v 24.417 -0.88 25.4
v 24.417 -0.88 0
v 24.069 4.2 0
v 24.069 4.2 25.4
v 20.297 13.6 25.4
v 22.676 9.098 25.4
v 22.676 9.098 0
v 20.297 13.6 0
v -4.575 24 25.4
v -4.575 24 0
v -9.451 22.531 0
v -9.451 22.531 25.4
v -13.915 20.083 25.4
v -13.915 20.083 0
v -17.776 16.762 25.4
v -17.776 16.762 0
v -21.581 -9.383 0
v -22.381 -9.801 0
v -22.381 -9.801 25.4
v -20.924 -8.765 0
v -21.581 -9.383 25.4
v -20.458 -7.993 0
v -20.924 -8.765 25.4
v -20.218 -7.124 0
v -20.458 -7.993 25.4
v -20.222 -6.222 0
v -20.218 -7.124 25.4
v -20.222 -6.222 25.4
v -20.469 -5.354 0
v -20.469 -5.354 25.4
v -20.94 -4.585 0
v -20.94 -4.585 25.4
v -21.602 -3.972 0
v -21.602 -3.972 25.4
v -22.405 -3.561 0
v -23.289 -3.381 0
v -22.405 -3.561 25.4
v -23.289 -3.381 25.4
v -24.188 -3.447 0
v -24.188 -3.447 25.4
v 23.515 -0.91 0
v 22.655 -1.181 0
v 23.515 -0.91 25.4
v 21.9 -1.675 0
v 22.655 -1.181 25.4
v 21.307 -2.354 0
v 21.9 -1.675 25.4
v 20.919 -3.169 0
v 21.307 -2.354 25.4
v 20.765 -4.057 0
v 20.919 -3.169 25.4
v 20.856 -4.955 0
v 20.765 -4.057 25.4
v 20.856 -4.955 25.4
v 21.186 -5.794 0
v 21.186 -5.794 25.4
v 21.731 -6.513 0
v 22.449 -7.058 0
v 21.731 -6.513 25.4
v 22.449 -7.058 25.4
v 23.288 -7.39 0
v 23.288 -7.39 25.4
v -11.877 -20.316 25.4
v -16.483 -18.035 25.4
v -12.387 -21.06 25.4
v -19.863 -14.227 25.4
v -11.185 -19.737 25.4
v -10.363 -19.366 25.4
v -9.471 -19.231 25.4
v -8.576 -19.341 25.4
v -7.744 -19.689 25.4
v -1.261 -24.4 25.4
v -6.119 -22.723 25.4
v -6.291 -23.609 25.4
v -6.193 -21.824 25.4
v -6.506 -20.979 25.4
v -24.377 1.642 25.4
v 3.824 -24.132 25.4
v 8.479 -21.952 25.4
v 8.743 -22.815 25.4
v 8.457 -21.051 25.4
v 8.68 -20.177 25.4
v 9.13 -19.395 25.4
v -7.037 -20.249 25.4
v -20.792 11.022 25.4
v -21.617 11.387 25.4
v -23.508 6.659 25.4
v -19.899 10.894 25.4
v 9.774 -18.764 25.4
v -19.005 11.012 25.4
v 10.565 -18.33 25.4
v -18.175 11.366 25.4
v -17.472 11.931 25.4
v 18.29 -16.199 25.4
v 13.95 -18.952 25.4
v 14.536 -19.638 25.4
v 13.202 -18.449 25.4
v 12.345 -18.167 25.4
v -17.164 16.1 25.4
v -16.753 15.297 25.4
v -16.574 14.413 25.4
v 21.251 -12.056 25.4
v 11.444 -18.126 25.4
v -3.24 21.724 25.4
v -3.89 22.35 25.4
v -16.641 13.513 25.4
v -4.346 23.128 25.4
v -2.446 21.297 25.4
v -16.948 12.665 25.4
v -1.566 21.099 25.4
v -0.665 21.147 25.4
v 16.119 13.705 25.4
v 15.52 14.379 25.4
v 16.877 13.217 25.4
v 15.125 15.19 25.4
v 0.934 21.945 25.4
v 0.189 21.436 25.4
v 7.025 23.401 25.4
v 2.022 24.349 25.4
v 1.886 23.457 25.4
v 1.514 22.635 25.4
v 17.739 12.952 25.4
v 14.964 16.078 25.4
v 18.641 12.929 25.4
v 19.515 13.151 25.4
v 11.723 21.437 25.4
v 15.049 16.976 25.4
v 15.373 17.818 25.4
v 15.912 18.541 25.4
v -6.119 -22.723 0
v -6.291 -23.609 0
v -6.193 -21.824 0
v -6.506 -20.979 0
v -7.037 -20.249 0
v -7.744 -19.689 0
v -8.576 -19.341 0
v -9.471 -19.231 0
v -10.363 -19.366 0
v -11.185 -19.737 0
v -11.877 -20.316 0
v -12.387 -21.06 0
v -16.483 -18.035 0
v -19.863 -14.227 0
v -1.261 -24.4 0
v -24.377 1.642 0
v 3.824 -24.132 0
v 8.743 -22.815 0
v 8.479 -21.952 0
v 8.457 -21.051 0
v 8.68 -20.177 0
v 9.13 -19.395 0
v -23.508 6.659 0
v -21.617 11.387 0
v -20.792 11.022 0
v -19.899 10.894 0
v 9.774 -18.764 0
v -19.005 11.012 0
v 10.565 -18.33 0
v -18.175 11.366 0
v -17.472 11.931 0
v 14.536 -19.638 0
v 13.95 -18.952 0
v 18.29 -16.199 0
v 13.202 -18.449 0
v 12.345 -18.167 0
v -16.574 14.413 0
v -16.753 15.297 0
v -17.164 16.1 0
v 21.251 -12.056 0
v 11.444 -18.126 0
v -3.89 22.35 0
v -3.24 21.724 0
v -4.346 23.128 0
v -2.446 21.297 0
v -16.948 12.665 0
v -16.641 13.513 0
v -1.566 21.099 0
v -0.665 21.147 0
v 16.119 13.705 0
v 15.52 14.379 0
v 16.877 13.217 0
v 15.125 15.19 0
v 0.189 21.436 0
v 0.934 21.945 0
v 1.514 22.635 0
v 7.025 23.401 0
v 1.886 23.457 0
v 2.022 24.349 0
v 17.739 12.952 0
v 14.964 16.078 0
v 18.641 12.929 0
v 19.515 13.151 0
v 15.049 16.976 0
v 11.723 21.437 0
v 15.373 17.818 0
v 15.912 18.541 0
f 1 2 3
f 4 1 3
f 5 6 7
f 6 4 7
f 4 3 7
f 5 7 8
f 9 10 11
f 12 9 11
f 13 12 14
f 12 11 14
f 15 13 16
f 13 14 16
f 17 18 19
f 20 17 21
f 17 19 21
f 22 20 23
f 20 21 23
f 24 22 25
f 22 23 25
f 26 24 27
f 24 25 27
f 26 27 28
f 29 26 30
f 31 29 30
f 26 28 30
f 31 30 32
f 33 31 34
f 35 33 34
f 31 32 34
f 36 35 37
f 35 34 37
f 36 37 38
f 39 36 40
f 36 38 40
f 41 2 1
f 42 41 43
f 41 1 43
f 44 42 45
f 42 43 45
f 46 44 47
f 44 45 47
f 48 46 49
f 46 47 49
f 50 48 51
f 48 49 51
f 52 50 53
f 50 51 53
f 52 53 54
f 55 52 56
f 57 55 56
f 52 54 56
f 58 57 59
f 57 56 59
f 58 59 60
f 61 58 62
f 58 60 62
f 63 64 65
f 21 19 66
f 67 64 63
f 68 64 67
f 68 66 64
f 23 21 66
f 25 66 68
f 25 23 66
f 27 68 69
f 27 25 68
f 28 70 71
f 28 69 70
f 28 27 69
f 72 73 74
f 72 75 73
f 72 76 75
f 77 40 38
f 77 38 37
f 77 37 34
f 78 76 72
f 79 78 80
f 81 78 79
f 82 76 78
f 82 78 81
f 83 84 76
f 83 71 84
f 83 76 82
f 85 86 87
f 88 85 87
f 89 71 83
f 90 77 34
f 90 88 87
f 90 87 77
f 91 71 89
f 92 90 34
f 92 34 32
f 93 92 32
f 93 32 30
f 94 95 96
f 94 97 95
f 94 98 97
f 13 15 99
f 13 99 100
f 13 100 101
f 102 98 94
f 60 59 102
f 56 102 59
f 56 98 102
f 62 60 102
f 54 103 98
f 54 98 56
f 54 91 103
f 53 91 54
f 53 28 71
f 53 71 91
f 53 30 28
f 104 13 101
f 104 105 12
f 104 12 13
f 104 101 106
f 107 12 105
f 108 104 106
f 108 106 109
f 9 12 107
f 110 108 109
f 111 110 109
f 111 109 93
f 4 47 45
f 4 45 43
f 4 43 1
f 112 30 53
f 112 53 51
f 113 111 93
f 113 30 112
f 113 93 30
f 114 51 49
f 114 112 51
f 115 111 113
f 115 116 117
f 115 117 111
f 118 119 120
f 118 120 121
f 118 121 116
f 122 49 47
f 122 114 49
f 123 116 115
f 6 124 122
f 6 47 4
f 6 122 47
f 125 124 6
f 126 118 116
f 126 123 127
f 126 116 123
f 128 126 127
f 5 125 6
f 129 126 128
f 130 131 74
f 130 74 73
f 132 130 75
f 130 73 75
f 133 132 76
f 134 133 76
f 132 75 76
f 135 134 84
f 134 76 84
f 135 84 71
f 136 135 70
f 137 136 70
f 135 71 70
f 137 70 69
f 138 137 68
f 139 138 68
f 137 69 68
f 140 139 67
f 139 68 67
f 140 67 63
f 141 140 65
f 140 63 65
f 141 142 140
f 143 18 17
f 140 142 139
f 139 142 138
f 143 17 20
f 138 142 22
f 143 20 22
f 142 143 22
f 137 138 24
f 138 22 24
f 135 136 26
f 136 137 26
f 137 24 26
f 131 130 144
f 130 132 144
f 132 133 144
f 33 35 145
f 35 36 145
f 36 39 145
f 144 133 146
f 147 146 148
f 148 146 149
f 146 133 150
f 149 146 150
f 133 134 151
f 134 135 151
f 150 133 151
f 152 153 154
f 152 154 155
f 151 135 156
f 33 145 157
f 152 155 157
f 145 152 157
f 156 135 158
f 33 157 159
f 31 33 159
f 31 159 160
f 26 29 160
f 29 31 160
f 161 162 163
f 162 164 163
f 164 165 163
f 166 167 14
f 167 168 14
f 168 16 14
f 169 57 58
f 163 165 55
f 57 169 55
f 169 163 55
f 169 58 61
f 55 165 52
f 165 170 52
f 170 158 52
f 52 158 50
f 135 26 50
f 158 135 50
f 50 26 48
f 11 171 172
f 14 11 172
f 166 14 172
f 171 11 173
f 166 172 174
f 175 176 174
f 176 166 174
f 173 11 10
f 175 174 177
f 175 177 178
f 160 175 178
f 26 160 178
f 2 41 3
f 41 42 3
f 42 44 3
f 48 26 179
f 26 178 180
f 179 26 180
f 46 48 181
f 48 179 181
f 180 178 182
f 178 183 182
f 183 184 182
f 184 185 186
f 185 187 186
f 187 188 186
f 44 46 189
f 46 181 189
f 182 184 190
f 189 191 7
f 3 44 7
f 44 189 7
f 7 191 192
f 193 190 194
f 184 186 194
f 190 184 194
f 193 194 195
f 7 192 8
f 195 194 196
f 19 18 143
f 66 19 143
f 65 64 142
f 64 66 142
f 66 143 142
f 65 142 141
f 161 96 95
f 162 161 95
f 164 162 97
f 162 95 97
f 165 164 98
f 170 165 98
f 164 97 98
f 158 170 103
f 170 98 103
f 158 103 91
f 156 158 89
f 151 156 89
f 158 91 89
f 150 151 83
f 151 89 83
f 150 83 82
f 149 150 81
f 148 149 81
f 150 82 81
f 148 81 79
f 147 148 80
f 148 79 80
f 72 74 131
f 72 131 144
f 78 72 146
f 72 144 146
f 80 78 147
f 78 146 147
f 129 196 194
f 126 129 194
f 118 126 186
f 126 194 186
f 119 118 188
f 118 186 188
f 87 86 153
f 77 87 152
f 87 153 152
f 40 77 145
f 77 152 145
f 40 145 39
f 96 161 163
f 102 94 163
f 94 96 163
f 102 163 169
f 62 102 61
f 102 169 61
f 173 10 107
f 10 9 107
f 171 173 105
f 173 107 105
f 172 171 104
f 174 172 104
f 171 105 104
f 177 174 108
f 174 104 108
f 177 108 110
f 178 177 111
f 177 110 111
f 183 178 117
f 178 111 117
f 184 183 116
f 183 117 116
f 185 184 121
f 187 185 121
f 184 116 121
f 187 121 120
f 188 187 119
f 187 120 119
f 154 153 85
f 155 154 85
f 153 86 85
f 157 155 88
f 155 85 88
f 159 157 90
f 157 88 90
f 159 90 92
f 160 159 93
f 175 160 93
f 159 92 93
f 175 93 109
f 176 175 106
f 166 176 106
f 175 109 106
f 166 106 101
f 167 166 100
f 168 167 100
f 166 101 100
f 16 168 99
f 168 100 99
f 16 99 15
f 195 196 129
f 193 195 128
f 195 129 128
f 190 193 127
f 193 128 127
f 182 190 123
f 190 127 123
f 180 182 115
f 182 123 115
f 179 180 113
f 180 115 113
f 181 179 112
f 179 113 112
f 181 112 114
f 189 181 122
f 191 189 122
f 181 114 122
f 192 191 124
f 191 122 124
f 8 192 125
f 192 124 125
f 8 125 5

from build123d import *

# Parameters (mm, degrees)
F0_R          = 24.432621
F1_DEPTH      = 25.4
F2_R          = 3.310973
F3_DEPTH      = 5.842
F3_DEPTH_BACK = 30.988
F4_COUNT      = 7


with BuildPart() as f1:
    # F0 (on Top) → F1 (new body)
    with BuildSketch(Plane.XY):
        Circle(F0_R)
    extrude(amount=F1_DEPTH)


with BuildPart() as f3:
    # F2 (on face) → F3 (new body, two sides)
    with BuildSketch(Plane.XY.offset(25.4)) as f3_sk:
        with Locations((-9.425403, -22.541401)):
            Circle(F2_R)
    extrude(amount=F3_DEPTH)
    extrude(f3_sk.sketch, amount=-F3_DEPTH_BACK)


with BuildPart() as f4_1:
    # F4: instance of F3
    add(f3.part.rotate(Axis((0, 0, 25.4), (0, 0, 1)), 1 * 360 / F4_COUNT))


with BuildPart() as f4_2:
    # F4: instance of F3
    add(f3.part.rotate(Axis((0, 0, 25.4), (0, 0, 1)), 2 * 360 / F4_COUNT))


with BuildPart() as f4_3:
    # F4: instance of F3
    add(f3.part.rotate(Axis((0, 0, 25.4), (0, 0, 1)), 3 * 360 / F4_COUNT))


with BuildPart() as f4_4:
    # F4: instance of F3
    add(f3.part.rotate(Axis((0, 0, 25.4), (0, 0, 1)), 4 * 360 / F4_COUNT))


with BuildPart() as f4_5:
    # F4: instance of F3
    add(f3.part.rotate(Axis((0, 0, 25.4), (0, 0, 1)), 5 * 360 / F4_COUNT))


with BuildPart() as f4_6:
    # F4: instance of F3
    add(f3.part.rotate(Axis((0, 0, 25.4), (0, 0, 1)), 6 * 360 / F4_COUNT))


with BuildPart() as f1_1:
    add(f1.part)

    # F5: cut F3, F4_1, F4_2, F4_3, F4_4, F4_5, F4_6
    add(f3.part, mode=Mode.SUBTRACT)
    add(f4_1.part, mode=Mode.SUBTRACT)
    add(f4_2.part, mode=Mode.SUBTRACT)
    add(f4_3.part, mode=Mode.SUBTRACT)
    add(f4_4.part, mode=Mode.SUBTRACT)
    add(f4_5.part, mode=Mode.SUBTRACT)
    add(f4_6.part, mode=Mode.SUBTRACT)


solid = f1_1.part
